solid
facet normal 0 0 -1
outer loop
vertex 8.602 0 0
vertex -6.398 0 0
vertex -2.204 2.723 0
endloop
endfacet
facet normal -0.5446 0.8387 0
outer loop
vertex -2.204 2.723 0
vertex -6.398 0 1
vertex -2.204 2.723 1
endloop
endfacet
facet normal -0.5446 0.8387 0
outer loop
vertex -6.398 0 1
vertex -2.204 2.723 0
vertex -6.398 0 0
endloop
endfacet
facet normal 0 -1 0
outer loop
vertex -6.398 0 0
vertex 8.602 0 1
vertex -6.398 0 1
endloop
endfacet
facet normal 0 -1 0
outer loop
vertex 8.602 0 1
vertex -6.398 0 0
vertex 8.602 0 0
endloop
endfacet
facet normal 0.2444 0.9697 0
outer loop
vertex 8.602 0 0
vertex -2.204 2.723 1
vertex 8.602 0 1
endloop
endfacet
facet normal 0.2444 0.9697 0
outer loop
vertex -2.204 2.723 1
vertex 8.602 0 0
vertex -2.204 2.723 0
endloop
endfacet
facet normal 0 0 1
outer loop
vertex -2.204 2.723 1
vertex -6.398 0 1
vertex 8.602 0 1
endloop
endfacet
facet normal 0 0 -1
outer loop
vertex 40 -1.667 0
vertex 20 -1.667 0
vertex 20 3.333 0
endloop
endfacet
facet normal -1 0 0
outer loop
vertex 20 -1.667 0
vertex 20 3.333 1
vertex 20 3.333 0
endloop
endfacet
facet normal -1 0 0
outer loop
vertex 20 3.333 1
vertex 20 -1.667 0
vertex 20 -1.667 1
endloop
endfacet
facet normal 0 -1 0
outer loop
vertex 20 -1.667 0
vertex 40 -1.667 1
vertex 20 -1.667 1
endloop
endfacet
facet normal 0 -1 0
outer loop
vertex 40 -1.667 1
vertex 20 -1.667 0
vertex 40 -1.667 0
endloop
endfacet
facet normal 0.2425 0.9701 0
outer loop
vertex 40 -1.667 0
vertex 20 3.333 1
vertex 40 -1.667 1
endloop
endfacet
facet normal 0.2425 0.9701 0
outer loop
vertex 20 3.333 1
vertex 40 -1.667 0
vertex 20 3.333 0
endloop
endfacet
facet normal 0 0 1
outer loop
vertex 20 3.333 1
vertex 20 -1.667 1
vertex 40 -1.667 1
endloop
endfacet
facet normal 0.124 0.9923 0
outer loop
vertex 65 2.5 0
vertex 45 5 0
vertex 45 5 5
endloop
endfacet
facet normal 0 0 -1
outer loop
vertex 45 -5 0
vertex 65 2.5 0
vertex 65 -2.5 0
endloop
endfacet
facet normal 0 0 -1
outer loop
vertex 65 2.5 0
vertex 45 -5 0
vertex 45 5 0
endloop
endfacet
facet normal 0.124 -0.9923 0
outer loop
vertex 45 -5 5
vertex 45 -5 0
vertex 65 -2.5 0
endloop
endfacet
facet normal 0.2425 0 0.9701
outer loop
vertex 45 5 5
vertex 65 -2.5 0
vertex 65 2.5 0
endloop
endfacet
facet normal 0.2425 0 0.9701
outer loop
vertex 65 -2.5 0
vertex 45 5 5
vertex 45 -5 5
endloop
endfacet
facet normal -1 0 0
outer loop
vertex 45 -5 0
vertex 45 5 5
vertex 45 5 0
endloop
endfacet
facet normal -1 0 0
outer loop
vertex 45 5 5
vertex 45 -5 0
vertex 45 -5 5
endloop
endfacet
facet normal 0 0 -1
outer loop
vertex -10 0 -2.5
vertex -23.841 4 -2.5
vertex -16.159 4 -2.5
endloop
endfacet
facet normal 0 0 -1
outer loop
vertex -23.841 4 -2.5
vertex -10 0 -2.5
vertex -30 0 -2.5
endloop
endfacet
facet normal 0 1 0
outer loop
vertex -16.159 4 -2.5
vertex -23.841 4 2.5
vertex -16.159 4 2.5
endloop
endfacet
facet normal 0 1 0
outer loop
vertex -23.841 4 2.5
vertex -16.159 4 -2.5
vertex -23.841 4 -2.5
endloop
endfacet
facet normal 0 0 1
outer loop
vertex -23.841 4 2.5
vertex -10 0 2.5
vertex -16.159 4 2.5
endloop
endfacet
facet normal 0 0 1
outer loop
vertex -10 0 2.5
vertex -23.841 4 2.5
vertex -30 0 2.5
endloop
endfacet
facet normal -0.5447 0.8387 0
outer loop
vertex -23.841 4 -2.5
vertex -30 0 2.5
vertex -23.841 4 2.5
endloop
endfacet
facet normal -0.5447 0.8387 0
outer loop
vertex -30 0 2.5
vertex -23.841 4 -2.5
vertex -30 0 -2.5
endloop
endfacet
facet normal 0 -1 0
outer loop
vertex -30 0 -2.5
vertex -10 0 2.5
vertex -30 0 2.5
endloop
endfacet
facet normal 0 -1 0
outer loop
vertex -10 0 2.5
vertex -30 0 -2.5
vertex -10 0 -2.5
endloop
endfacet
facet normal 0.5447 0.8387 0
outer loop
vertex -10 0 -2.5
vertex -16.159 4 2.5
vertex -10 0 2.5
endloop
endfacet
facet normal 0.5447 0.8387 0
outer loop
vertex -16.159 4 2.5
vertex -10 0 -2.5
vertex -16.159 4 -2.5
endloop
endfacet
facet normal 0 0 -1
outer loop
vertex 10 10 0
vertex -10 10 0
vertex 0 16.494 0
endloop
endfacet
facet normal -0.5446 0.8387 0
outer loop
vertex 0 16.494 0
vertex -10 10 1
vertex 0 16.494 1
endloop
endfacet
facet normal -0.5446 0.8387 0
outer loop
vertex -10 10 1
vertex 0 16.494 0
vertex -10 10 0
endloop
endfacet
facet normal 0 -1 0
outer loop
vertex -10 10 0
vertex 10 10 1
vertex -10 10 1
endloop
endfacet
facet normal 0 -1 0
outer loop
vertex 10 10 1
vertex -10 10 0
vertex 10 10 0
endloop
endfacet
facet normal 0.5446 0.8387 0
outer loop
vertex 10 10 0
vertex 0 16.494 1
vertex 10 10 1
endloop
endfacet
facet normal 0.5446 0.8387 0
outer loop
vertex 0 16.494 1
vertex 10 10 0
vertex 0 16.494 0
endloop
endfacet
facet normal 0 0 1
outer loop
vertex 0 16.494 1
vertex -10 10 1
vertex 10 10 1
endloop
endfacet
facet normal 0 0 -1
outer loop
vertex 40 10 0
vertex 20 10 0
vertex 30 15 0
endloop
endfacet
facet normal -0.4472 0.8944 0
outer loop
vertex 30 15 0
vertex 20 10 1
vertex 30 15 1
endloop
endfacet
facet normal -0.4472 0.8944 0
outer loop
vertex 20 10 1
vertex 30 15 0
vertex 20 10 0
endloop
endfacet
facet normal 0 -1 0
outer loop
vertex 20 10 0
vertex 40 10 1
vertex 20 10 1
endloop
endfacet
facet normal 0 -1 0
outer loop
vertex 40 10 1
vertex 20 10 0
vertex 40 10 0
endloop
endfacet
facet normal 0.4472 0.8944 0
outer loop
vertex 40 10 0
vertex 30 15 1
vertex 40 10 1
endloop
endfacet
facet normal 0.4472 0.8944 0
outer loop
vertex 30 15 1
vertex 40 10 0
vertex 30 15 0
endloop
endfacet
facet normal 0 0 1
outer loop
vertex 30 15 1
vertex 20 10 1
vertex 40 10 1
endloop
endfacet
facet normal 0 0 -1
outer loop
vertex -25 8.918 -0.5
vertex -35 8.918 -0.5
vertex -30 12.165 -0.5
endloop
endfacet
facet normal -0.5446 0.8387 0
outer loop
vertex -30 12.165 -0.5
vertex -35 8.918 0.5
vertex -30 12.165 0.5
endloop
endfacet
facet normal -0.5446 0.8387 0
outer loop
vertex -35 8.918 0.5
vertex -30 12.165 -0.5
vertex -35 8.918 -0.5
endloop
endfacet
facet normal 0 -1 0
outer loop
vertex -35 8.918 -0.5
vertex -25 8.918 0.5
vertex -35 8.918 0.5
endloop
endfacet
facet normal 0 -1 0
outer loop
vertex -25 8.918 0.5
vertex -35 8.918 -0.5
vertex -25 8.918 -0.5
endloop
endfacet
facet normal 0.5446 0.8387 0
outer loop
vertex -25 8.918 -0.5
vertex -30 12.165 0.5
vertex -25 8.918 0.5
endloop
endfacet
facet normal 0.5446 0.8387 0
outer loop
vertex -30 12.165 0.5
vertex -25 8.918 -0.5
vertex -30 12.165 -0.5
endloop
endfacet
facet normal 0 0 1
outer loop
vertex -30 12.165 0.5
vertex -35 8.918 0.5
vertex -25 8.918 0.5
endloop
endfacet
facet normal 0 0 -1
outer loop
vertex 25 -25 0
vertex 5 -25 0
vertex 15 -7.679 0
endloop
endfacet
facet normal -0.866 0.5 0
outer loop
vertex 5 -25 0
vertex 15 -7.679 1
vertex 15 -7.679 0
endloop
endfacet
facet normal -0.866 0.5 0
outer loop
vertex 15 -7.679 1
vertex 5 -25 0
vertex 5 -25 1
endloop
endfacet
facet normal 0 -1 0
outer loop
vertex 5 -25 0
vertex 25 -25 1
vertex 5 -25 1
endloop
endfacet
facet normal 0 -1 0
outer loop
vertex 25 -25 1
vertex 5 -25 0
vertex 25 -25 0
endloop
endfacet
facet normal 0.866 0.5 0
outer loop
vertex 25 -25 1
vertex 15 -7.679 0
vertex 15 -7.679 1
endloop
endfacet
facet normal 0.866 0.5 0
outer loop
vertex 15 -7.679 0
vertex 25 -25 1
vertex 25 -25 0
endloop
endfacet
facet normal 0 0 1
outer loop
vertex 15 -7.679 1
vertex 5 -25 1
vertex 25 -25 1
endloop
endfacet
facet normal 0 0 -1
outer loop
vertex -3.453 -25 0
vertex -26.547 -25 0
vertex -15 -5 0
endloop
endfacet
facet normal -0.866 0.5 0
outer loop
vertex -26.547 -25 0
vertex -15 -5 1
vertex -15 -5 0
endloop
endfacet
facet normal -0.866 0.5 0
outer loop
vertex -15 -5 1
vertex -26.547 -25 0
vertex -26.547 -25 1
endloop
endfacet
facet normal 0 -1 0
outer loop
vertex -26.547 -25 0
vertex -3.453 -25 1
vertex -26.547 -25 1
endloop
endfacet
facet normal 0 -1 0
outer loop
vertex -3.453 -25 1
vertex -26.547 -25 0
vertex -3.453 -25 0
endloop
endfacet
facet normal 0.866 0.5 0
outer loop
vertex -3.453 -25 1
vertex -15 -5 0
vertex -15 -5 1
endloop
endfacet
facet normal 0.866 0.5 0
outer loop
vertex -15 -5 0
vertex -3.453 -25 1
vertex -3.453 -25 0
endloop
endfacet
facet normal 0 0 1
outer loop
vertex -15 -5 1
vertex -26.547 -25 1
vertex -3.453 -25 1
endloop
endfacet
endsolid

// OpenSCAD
/*
Triangles.scad
 Author: Tim Koopman
 https://github.com/tkoopman/Delta-Diamond/blob/master/OpenSCAD/Triangles.scad

         angleCA
           /|\
        a / H \ c
         /  |  \
 angleAB ------- angleBC
            b

Standard Parameters
	center: true/false
		If true same as centerXYZ = [true, true, true]

	centerXYZ: Vector of 3 true/false values [CenterX, CenterY, CenterZ]
		center must be left undef

	height: The 3D height of the Triangle. Ignored if heights defined

	heights: Vector of 3 height values heights @ [angleAB, angleBC, angleCA]
		If CenterZ is true each height will be centered individually, this means
		the shape will be different depending on CenterZ. Most times you will want
		CenterZ to be true to get the shape most people want.
*/

/* 
Triangle
	a: Length of side a
	b: Length of side b
	angle: angle at point angleAB
*/
module Triangle(
			a, b, angle, height=1, heights=undef,
			center=undef, centerXYZ=[false,false,false])
{
	// Calculate Heights at each point
	heightAB = ((heights==undef) ? height : heights[0])/2;
	heightBC = ((heights==undef) ? height : heights[1])/2;
	heightCA = ((heights==undef) ? height : heights[2])/2;
	centerZ = (center || (center==undef && centerXYZ[2]))?0:max(heightAB,heightBC,heightCA);

	// Calculate Offsets for centering
	offsetX = (center || (center==undef && centerXYZ[0]))?((cos(angle)*a)+b)/3:0;
	offsetY = (center || (center==undef && centerXYZ[1]))?(sin(angle)*a)/3:0;
	
	pointAB1 = [-offsetX,-offsetY, centerZ-heightAB];
	pointAB2 = [-offsetX,-offsetY, centerZ+heightAB];
	pointBC1 = [b-offsetX,-offsetY, centerZ-heightBC];
	pointBC2 = [b-offsetX,-offsetY, centerZ+heightBC];
	pointCA1 = [(cos(angle)*a)-offsetX,(sin(angle)*a)-offsetY, centerZ-heightCA];
	pointCA2 = [(cos(angle)*a)-offsetX,(sin(angle)*a)-offsetY, centerZ+heightCA];

	polyhedron(
		points=[	pointAB1, pointBC1, pointCA1,
					pointAB2, pointBC2, pointCA2 ],
		triangles=[	
			[0, 1, 2],
			[3, 5, 4],
			[0, 3, 1],
			[1, 3, 4],
			[1, 4, 2],
			[2, 4, 5],
			[2, 5, 0],
			[0, 5, 3] ] );
}

/*
Isosceles Triangle
	Exactly 2 of the following paramaters must be defined.
	If all 3 defined H will be ignored.
	b: length of side b
	angle: angle at points angleAB & angleBC.
*/
module Isosceles_Triangle(
			b, angle, H=undef, height=1, heights=undef,
			center=undef, centerXYZ=[true, false, false])
{
	valid = 	(angle!=undef)?((angle < 90) && (b!=undef||H!=undef)) : (b!=undef&&H!=undef);
	ANGLE = (angle!=undef) ? angle : atan(H / (b/2));
	a = (b==undef)?(H/sin((180-(angle*2))/2)) : 
		 (b / cos(ANGLE))/2;
	B = (b==undef)? (cos(angle)*a)*2:b;
	if (valid)
	{
		Triangle(a=a, b=B, angle=ANGLE, height=height, heights=heights,
					center=center, centerXYZ=centerXYZ);
	} else {
		echo("Invalid Isosceles_Triangle. Must specify any 2 of b, angle and H, and if angle used angle must be less than 90");
	}
}

/*
Right Angled Triangle
	Create a Right Angled Triangle where the hypotenuse will be calculated.

       |\
      a| \
       |  \
       ----
         b
	a: length of side a
	b: length of side b
*/
module Right_Angled_Triangle(
			a, b, height=1, heights=undef,
			center=undef, centerXYZ=[false, false, false])
{
	Triangle(a=a, b=b, angle=90, height=height, heights=heights,
				center=center, centerXYZ=centerXYZ);
}

/*
Wedge
	Is same as Right Angled Triangle with 2 different heights, and rotated.
	Good for creating support structures.
*/
module Wedge(a, b, w1, w2)
{
	rotate([90,0,0])
		Right_Angled_Triangle(a, b, heights=[w1, w2, w1], centerXYZ=[false, false, true]);
}

/*
Equilateral Triangle
	Create a Equilateral Triangle.

	l: Length of all sides (a, b & c)
	H: Triangle size will be based on the this 2D height
		When using H, l is ignored.
*/
module Equilateral_Triangle(
			l=10, H=undef, height=1, heights=undef,
			center=undef, centerXYZ=[true,false,false])
{
	L = (H==undef)?l:H/sin(60);
	Triangle(a=L,b=L,angle=60,height=height, heights=heights,
				center=center, centerXYZ=centerXYZ);
}

/*
Trapezoid
	Create a Basic Trapezoid (Based on Isosceles_Triangle)

            d
          /----\
         /  |   \
     a  /   H    \ c
       /    |     \
 angle ------------ angle
            b

	b: Length of side b
	angle: Angle at points angleAB & angleBC
	H: The 2D height at which the triangle should be cut to create the trapezoid
	heights: If vector of size 3 (Standard for triangles) both cd & da will be the same height, if vector have 4 values [ab,bc,cd,da] than each point can have different heights.
*/
module Trapezoid(
			b, angle=60, H, height=1, heights=undef,
			center=undef, centerXYZ=[true,false,false])
{
	validAngle = (angle < 90);
	adX = H / tan(angle);

	// Calculate Heights at each point
	heightAB = ((heights==undef) ? height : heights[0])/2;
	heightBC = ((heights==undef) ? height : heights[1])/2;
	heightCD = ((heights==undef) ? height : heights[2])/2;
	heightDA = ((heights==undef) ? height : ((len(heights) > 3)?heights[3]:heights[2]))/2;

	// Centers
	centerX = (center || (center==undef && centerXYZ[0]))?0:b/2;
	centerY = (center || (center==undef && centerXYZ[1]))?0:H/2;
	centerZ = (center || (center==undef && centerXYZ[2]))?0:max(heightAB,heightBC,heightCD,heightDA);

	// Points
	y = H/2;
	bx = b/2;
	dx = (b-(adX*2))/2;

	pointAB1 = [centerX-bx, centerY-y, centerZ-heightAB];
	pointAB2 = [centerX-bx, centerY-y, centerZ+heightAB];
	pointBC1 = [centerX+bx, centerY-y, centerZ-heightBC];
	pointBC2 = [centerX+bx, centerY-y, centerZ+heightBC];
	pointCD1 = [centerX+dx, centerY+y, centerZ-heightCD];
	pointCD2 = [centerX+dx, centerY+y, centerZ+heightCD];
	pointDA1 = [centerX-dx, centerY+y, centerZ-heightDA];
	pointDA2 = [centerX-dx, centerY+y, centerZ+heightDA];

	validH = (adX < b/2);

	if (validAngle && validH)
	{
		polyhedron(
			points=[	pointAB1, pointBC1, pointCD1, pointDA1,
						pointAB2, pointBC2, pointCD2, pointDA2 ],
			triangles=[	
				[0, 1, 2],
				[0, 2, 3],
				[4, 6, 5],
				[4, 7, 6],
				[0, 4, 1],
				[1, 4, 5],
				[1, 5, 2],
				[2, 5, 6],
				[2, 6, 3],
				[3, 6, 7],
				[3, 7, 0],
				[0, 7, 4]	] );
	} else {
		if (!validAngle) echo("Trapezoid invalid, angle must be less than 90");
		else echo("Trapezoid invalid, H is larger than triangle");
	}
}


// Examples
Triangle(a=5, b=15, angle=33, centerXYZ=[true,false,false]);
color("red") translate([20,0,0]) Right_Angled_Triangle(a=5, b=20, centerXYZ=[false,true,false]);
color("orange") translate([45,0,0]) Wedge(a=5, b=20, w1=10, w2=5);
color("yellow") translate([-20,0,0]) Trapezoid(b=20, angle=33, H=4, height=5, centerXYZ=[true,false,true]);

color("green") translate([0,10,0]) Isosceles_Triangle(b=20, angle=33);
color("blue") translate([30,10,0]) Isosceles_Triangle(b=20, H=5);
color("violet") translate([-30,10,0]) Isosceles_Triangle(angle=33, H=5, center=true);

color("black") translate([15,-25,0]) Equilateral_Triangle(l=20);
color("white") translate([-15,-25,0]) Equilateral_Triangle(H=20);
